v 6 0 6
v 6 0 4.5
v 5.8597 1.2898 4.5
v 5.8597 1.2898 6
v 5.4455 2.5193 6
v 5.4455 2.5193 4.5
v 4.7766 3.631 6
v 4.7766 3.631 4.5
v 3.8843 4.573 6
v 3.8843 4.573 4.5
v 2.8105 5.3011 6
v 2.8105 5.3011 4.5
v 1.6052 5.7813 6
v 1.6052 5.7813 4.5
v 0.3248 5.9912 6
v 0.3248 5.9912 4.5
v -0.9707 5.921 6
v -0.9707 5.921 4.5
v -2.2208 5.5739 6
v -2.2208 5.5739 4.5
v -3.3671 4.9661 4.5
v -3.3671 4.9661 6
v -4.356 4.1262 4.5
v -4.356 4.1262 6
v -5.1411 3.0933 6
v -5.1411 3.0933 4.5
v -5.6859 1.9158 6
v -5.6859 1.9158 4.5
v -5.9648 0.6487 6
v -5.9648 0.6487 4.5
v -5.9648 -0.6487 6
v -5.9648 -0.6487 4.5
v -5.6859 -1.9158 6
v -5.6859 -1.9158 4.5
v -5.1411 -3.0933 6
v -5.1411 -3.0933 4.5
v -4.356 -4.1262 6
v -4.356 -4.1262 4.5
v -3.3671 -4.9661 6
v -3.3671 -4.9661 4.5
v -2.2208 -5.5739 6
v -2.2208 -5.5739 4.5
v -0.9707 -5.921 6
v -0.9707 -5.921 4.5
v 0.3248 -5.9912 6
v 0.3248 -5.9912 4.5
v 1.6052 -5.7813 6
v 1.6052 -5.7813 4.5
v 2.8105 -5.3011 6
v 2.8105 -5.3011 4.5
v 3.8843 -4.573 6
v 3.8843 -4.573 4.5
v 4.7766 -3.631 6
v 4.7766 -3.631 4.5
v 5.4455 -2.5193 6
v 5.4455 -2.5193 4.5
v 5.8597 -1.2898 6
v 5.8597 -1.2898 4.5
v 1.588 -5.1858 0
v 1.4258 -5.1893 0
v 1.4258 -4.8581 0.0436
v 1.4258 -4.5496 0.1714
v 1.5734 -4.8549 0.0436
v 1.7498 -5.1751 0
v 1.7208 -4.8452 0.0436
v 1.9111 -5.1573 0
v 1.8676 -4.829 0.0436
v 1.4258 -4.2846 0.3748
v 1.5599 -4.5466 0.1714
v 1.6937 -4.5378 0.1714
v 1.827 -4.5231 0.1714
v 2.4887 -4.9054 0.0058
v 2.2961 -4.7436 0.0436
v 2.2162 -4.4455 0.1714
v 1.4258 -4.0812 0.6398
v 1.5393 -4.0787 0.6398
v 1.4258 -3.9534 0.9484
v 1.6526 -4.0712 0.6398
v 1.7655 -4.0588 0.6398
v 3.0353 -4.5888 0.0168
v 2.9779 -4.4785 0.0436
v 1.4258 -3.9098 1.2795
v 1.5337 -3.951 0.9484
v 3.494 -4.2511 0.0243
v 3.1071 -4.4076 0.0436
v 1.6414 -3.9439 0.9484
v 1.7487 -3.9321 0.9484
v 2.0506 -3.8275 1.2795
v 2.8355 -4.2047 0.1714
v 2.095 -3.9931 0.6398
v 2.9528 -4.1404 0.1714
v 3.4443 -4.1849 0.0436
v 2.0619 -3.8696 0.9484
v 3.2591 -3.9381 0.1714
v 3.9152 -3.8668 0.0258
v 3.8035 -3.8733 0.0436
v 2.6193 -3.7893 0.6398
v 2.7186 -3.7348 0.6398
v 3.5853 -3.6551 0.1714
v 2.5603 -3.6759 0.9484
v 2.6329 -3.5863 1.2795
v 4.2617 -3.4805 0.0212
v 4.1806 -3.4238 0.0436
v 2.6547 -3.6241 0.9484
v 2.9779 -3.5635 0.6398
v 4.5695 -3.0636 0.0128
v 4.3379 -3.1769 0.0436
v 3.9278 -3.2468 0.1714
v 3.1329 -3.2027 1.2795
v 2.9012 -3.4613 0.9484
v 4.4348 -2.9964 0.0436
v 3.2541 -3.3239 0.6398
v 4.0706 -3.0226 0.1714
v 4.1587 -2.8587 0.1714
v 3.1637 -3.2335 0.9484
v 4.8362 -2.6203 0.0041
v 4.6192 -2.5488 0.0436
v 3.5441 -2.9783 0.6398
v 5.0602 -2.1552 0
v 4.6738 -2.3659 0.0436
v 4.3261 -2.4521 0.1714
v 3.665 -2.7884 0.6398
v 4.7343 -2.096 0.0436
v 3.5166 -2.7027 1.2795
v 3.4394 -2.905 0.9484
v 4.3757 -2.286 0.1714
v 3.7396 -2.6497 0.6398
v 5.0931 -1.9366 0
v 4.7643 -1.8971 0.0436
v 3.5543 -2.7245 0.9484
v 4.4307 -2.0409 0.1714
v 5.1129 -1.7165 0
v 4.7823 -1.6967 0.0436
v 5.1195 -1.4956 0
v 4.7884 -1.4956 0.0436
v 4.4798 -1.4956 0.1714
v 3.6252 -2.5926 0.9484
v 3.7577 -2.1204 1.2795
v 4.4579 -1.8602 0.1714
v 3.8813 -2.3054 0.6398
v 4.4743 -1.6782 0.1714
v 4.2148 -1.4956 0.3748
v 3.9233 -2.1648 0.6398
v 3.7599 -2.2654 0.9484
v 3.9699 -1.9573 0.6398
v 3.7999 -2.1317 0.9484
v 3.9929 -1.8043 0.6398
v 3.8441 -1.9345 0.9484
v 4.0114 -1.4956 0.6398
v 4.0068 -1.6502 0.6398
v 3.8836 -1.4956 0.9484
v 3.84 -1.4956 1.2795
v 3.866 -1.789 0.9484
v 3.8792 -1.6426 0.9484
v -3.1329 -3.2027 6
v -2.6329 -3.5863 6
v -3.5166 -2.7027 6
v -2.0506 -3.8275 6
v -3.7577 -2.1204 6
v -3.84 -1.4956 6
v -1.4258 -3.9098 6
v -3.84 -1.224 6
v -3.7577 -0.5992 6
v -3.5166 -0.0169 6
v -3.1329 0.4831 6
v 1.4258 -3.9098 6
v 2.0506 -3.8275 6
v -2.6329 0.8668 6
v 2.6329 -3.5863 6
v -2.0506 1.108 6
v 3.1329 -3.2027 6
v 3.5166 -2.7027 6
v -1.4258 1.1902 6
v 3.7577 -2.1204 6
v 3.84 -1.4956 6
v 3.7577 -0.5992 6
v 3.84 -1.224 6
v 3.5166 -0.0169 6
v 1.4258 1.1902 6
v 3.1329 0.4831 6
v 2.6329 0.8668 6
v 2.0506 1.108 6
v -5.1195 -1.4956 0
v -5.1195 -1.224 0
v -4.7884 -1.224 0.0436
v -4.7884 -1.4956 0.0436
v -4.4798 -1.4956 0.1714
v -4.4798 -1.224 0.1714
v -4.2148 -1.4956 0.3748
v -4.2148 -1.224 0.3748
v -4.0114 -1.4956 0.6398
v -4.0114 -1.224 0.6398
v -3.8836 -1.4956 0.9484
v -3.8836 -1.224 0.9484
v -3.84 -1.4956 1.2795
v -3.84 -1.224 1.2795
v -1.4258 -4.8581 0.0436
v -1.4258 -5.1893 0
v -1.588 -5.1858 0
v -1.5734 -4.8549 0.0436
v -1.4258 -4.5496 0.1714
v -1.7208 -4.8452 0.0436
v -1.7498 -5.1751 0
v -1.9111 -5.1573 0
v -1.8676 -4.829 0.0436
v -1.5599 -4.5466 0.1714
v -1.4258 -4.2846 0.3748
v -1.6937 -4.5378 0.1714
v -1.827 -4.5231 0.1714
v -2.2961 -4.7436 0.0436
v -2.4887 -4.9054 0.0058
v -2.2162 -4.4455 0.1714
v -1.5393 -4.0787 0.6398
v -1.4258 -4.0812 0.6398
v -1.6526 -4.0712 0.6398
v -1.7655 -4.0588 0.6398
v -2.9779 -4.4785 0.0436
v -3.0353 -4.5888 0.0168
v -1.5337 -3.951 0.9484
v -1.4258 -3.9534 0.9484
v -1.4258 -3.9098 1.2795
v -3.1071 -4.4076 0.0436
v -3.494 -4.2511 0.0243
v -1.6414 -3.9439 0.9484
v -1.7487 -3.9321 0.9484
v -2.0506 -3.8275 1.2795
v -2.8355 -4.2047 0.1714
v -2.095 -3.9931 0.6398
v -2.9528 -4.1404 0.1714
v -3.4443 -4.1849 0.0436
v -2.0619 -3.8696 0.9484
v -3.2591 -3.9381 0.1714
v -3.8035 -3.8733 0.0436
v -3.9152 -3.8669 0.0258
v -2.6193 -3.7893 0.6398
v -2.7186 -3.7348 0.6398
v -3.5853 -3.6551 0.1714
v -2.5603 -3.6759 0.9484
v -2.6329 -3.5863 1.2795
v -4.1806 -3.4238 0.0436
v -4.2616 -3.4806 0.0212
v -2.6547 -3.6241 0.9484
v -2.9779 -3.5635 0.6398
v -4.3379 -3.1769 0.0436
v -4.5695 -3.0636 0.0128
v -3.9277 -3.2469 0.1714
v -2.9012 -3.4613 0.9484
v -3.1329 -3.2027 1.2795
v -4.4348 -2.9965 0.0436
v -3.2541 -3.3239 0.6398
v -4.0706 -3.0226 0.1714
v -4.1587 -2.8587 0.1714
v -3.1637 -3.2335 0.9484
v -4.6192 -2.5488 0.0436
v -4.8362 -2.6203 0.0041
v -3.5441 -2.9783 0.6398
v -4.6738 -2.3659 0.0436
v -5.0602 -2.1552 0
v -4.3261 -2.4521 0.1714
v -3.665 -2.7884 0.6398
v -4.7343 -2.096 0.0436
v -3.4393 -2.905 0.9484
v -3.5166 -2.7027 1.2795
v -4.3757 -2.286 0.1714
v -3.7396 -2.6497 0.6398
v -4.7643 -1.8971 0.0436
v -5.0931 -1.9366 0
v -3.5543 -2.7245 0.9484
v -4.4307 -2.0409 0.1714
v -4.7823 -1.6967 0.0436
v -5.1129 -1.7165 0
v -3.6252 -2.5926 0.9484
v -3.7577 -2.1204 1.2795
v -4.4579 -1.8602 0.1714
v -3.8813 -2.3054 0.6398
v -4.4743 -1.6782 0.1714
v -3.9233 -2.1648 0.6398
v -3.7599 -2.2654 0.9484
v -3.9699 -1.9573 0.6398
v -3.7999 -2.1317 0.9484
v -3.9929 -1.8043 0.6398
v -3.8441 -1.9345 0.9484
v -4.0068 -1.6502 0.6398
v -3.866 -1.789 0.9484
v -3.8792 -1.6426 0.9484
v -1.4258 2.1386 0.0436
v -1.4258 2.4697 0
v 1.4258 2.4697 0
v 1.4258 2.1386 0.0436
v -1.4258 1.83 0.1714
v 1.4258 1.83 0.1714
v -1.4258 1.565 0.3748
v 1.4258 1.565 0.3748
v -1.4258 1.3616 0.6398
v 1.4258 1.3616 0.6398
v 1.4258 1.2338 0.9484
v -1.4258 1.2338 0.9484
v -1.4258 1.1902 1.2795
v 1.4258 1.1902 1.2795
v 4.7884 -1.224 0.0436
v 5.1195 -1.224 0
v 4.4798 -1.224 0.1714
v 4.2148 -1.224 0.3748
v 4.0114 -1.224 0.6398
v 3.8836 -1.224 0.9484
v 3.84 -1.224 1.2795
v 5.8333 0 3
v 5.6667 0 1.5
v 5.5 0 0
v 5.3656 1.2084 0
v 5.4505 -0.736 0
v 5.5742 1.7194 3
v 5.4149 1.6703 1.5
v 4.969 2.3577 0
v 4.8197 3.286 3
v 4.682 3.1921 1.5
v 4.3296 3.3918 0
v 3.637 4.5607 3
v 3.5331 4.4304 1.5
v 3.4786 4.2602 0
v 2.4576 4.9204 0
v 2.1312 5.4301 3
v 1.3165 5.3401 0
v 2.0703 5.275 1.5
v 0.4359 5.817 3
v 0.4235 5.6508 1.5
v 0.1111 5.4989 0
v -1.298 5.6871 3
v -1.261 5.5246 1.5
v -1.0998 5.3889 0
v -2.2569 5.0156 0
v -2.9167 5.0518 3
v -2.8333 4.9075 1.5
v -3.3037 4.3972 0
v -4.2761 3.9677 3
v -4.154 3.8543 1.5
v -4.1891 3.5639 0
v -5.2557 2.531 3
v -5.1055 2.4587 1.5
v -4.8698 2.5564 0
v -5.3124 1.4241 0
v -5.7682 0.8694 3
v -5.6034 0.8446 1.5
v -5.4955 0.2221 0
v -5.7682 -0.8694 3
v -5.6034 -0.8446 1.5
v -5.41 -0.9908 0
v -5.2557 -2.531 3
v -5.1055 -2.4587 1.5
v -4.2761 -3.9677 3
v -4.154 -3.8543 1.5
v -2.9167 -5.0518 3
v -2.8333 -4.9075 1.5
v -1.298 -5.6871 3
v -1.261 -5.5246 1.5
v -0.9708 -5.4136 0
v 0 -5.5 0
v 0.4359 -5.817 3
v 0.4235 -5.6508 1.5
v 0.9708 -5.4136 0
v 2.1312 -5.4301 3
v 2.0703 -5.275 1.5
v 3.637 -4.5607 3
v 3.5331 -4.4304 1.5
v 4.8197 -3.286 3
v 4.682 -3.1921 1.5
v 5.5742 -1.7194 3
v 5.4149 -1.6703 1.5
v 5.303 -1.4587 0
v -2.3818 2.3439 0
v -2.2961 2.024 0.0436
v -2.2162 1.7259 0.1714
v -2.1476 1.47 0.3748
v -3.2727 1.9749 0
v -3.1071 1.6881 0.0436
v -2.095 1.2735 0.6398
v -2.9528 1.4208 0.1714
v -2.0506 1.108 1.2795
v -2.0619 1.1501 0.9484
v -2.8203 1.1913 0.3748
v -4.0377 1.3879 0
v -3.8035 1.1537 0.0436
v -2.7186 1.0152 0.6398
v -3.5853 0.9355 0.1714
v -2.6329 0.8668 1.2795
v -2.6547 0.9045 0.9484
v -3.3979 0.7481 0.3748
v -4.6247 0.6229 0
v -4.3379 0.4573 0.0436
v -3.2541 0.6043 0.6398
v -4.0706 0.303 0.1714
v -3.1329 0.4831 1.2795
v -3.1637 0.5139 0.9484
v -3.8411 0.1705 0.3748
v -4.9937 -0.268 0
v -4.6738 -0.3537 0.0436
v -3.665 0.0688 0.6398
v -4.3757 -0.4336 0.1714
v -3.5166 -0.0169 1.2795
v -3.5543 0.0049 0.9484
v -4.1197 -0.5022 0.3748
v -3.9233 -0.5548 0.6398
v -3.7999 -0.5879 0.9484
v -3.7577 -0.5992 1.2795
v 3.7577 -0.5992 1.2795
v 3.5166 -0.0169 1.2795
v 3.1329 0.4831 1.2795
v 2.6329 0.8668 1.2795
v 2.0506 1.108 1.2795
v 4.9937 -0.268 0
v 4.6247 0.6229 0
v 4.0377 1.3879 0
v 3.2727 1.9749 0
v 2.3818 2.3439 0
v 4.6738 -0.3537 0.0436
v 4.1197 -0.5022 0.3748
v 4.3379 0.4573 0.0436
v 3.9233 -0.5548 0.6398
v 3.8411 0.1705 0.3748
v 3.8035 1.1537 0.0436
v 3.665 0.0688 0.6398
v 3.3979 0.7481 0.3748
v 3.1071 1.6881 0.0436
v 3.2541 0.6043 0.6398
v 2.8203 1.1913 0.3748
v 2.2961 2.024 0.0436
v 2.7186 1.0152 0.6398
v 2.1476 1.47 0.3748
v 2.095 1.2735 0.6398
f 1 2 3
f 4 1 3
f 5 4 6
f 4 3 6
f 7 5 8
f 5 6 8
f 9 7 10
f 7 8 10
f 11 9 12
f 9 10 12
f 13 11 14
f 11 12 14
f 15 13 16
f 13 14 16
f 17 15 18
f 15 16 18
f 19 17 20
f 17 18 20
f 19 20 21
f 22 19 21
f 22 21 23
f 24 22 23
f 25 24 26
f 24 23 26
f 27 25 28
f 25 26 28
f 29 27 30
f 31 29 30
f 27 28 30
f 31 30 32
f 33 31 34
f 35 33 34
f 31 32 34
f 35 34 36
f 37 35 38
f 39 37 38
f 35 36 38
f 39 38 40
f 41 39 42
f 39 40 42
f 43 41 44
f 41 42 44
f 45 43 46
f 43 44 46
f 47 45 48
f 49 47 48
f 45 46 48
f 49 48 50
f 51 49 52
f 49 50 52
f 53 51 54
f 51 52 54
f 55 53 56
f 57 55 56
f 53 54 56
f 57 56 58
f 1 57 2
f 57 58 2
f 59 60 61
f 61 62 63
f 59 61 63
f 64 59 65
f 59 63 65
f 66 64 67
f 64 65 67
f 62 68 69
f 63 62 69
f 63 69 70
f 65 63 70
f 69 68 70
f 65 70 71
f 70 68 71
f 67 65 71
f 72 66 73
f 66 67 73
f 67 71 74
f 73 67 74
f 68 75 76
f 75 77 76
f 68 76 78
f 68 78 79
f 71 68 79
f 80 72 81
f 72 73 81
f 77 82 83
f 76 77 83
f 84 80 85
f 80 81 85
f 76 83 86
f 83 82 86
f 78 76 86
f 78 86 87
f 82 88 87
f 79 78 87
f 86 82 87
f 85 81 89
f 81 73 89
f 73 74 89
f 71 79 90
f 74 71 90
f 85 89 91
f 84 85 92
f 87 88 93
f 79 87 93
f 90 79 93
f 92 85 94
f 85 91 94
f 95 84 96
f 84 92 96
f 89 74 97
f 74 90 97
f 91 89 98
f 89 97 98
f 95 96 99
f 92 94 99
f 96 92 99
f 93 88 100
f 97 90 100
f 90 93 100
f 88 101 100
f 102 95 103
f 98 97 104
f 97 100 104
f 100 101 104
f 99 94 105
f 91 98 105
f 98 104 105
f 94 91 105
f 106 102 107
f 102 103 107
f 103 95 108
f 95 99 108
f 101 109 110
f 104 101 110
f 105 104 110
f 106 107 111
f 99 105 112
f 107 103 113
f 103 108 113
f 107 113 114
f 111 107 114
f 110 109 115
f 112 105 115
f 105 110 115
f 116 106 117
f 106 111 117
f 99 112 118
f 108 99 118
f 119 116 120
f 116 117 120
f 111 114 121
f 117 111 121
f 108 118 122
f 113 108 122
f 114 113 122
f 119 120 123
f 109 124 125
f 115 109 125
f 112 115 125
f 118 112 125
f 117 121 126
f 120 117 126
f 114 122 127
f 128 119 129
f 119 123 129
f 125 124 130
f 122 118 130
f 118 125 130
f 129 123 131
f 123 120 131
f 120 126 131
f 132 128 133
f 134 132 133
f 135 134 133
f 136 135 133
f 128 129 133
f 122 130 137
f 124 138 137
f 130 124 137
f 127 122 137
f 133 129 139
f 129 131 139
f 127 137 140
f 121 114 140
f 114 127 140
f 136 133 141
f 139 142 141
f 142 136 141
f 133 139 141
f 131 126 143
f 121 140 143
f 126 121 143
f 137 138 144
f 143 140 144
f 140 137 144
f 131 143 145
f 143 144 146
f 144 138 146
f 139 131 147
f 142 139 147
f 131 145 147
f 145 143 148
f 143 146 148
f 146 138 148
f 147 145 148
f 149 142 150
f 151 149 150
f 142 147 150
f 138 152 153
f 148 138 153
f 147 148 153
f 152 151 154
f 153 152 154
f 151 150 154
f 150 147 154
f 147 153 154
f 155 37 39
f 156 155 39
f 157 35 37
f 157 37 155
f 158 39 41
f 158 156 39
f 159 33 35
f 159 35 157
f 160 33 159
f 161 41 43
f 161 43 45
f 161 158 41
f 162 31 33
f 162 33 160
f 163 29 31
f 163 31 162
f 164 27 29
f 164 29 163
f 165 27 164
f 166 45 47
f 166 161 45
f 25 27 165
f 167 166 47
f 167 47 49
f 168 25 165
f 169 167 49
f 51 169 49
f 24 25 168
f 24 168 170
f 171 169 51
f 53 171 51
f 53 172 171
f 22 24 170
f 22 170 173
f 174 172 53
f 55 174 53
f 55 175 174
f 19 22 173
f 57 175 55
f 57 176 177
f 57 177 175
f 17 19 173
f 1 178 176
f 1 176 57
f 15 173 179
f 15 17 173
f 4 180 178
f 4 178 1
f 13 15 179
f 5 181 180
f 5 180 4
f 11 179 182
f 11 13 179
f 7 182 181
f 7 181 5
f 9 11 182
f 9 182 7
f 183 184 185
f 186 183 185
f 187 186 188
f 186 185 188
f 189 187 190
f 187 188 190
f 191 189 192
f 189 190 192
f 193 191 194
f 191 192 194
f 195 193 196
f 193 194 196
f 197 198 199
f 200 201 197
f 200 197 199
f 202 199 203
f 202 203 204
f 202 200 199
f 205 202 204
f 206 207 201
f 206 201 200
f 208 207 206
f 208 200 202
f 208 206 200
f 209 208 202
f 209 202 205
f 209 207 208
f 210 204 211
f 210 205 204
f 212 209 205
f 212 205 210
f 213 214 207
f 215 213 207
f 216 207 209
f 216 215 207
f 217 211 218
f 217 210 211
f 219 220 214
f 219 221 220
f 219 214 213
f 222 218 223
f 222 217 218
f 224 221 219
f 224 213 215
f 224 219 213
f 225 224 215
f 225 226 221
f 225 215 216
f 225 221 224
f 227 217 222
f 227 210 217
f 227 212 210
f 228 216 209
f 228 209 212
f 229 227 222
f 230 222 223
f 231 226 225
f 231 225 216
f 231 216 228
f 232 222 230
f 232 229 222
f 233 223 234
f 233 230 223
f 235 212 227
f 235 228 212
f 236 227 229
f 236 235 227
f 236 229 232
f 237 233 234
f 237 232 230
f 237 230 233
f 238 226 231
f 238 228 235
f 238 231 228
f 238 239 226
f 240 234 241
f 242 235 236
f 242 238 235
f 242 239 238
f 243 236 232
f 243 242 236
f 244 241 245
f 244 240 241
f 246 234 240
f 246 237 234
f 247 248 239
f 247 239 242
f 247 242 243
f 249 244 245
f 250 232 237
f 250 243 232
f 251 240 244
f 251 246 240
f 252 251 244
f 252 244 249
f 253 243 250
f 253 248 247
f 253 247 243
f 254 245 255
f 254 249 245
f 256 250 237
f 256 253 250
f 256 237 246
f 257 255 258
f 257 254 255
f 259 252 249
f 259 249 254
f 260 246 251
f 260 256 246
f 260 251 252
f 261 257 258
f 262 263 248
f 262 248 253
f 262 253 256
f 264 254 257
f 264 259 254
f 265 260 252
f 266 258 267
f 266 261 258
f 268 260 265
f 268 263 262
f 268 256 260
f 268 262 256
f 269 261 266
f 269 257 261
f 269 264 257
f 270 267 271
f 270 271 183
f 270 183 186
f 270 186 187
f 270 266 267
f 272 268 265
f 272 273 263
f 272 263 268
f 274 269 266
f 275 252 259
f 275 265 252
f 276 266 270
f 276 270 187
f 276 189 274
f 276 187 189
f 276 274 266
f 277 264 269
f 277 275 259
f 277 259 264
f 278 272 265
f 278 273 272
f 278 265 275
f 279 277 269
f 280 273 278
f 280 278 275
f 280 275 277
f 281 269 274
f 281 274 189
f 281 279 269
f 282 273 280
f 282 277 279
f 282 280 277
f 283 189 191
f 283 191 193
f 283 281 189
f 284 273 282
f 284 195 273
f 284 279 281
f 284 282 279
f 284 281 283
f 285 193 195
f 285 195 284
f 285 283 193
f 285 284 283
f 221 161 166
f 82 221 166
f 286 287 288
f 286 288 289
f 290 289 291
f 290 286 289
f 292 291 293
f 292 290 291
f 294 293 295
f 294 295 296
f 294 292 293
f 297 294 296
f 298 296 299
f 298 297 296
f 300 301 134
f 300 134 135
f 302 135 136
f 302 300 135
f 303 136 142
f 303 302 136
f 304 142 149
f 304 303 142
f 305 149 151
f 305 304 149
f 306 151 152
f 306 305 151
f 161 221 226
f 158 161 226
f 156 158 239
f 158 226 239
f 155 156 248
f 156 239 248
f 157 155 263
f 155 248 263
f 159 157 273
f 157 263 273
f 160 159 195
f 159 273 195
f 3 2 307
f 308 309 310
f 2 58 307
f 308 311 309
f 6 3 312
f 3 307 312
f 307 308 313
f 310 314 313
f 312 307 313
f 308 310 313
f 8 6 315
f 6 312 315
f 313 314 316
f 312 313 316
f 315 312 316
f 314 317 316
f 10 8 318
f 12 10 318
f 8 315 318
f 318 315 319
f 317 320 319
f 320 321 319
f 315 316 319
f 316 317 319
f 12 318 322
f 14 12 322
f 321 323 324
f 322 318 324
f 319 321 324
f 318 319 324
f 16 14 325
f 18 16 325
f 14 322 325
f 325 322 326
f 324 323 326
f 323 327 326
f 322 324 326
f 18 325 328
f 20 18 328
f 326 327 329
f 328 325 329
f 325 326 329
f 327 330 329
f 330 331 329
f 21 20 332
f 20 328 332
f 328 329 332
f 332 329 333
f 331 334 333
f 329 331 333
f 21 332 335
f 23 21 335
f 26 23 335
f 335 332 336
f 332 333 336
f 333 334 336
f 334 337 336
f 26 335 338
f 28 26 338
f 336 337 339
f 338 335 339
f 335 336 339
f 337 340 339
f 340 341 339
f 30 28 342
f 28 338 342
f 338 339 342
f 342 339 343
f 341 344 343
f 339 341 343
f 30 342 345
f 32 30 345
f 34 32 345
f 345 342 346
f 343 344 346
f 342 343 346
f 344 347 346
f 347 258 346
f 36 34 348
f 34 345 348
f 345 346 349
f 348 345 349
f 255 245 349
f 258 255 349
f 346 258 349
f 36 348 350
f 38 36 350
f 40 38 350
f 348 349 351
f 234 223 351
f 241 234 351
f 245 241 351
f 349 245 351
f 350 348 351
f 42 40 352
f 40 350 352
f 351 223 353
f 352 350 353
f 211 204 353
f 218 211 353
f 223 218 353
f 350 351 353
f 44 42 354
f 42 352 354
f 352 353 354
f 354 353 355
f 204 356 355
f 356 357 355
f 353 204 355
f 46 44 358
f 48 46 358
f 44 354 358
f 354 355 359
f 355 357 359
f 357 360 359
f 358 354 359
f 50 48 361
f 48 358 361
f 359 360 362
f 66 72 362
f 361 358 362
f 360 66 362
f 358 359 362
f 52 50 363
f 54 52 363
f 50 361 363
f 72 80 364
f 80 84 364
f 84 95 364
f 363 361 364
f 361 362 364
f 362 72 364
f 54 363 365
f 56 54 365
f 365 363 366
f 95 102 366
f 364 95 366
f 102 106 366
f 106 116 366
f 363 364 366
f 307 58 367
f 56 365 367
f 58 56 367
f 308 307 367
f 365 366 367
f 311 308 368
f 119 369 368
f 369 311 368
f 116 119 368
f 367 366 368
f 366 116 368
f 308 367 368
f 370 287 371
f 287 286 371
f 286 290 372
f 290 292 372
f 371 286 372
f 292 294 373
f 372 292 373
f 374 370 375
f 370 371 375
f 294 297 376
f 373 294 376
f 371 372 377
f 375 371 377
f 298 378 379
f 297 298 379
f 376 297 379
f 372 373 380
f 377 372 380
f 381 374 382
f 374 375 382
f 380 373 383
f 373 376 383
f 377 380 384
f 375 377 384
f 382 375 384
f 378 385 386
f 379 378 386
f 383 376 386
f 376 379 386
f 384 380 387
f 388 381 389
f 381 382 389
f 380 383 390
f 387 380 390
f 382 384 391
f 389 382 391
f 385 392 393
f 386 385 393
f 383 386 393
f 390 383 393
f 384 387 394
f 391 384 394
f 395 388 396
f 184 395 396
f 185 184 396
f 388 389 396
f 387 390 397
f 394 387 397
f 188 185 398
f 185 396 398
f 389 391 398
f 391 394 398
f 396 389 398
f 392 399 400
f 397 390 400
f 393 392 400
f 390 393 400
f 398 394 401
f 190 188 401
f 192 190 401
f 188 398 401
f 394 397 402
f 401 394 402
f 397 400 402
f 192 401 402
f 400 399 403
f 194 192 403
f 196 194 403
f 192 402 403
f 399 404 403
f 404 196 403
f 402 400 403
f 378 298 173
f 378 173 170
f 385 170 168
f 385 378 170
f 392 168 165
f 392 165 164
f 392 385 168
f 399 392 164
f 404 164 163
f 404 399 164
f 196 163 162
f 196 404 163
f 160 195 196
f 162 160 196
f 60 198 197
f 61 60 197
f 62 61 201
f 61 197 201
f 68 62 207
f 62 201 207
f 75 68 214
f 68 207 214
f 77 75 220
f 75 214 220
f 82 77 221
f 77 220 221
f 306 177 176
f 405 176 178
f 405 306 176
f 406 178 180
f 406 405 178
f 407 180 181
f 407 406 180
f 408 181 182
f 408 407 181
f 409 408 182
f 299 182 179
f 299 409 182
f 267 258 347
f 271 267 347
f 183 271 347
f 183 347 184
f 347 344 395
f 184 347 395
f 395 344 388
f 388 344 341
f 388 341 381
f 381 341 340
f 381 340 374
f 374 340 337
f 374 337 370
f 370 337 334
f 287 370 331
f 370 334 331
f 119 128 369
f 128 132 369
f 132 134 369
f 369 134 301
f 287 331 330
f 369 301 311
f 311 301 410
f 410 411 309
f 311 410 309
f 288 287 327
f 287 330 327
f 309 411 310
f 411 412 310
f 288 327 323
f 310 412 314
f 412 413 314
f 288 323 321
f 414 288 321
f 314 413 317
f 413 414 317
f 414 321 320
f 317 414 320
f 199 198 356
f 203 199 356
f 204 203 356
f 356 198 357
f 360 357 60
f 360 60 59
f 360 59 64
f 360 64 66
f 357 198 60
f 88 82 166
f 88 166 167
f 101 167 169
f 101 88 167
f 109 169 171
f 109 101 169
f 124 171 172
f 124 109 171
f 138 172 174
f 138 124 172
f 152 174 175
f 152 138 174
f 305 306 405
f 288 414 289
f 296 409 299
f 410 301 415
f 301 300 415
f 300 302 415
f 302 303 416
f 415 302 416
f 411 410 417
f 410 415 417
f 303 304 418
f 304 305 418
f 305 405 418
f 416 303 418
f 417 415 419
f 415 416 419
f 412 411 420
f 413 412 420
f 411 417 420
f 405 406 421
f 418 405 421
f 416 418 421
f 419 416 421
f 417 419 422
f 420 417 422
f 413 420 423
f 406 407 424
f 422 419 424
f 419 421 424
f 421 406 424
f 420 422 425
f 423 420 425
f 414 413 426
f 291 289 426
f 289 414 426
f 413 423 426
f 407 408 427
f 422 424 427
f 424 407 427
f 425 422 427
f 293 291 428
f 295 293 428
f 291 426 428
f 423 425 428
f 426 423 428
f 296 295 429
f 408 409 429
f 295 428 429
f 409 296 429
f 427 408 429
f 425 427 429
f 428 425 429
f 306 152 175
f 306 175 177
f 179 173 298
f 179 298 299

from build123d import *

# Parameters (mm, degrees)
F0_R         = 6
F1_DEPTH     = 6
F2_W         = 7.68
F2_H         = 5.1
F3_DEPTH     = 25
F4_R         = 2.4142135624
F5_SIZE2     = 0.5
F5_SIZE      = 4.5
F6_T1_DEPTH  = 2.8515728753
F6_T3_DEPTH  = 0.2715728753
F6_T6_ANGLE  = 90
F6_T8_ANGLE  = 90
F6_T10_ANGLE = 90
F6_T12_ANGLE = 90


# Not quite as in the source:
# - a fillet or chamfer that OpenCascade refuses, or shapes differently, is made with other operations: its cross-section is extruded or revolved along the edge and cut away or added


with BuildPart() as f1:
    # F0 (on Top) → F1 (new body)
    with BuildSketch(Plane.XY):
        Circle(F0_R)
    extrude(amount=F1_DEPTH)

    # F2 (on face) → F3 (cut)
    with BuildSketch(Plane.XY.offset(6)):
        with Locations((0, -1.3597839279)):
            Rectangle(F2_W, F2_H)
    extrude(amount=-F3_DEPTH, mode=Mode.SUBTRACT)

    # F4
    f4_edges = [f1.edges().sort_by_distance(p)[0] for p in [
        (-3.84, 1.190216, 3),
        (3.84, 1.190216, 3),
        (3.84, -3.909784, 3),
        (-3.84, -3.909784, 3),
    ]]
    fillet(f4_edges, radius=F4_R)

    # F5
    f5_edges = [f1.edges().sort_by_distance(p)[0] for p in [
        (-6, 0, 0),
    ]]
    f5_side = f1.faces().sort_by_distance((-6, 0, 3))[0]
    chamfer(f5_edges, length=F5_SIZE, length2=F5_SIZE2, reference=f5_side)

    # F6: fillet of radius 1.2795331881 on 8 edges, made by hand

    # F6_s2 → F6_t1 (cut)
    with BuildSketch(Plane.YZ.offset(-1.4257864376)):
        with BuildLine():
            ThreePointArc((-5.189317116, 0), (-4.2845505219, 0.374766594), (-3.9097839279, 1.2795331881))
            Line((-3.9097839279, 1.2795331881), (-3.9097839279, 0))
            Line((-3.9097839279, 0), (-5.189317116, 0))
        make_face()
        with BuildLine():
            ThreePointArc((2.4697492601, 0), (1.5649826661, 0.374766594), (1.1902160721, 1.2795331881))
            Line((1.1902160721, 1.2795331881), (1.1902160721, 0))
            Line((1.1902160721, 0), (2.4697492601, 0))
        make_face()
    extrude(amount=F6_T1_DEPTH, mode=Mode.SUBTRACT)

    # F6_s4 → F6_t3 (cut)
    with BuildSketch(Plane.XZ.offset(1.2239974903)):
        with BuildLine():
            ThreePointArc((-5.1195331881, 0), (-4.214766594, 0.374766594), (-3.84, 1.2795331881))
            Line((-3.84, 1.2795331881), (-3.84, 0))
            Line((-3.84, 0), (-5.1195331881, 0))
        make_face()
        with BuildLine():
            ThreePointArc((5.1195331881, 0), (4.214766594, 0.374766594), (3.84, 1.2795331881))
            Line((3.84, 1.2795331881), (3.84, 0))
            Line((3.84, 0), (5.1195331881, 0))
        make_face()
    extrude(amount=F6_T3_DEPTH, mode=Mode.SUBTRACT)

    # F6_s5 → F6_t6 (revolve, cut)
    with BuildSketch(Plane.YZ.offset(-1.4257864376)):
        with BuildLine():
            ThreePointArc((2.4697492601, 0), (1.5649826661, 0.374766594), (1.1902160721, 1.2795331881))
            Line((1.1902160721, 1.2795331881), (1.1902160721, 0))
            Line((1.1902160721, 0), (2.4697492601, 0))
        make_face()
    revolve(axis=Axis((-1.4257864376, -1.2239974903, 0), (0, 0, 1)), revolution_arc=F6_T6_ANGLE, mode=Mode.SUBTRACT)

    # F6_s7 → F6_t8 (revolve, cut)
    with BuildSketch(Plane.YZ.offset(-1.4257864376)):
        with BuildLine():
            ThreePointArc((-5.189317116, 0), (-4.2845505219, 0.374766594), (-3.9097839279, 1.2795331881))
            Line((-3.9097839279, 1.2795331881), (-3.9097839279, 0))
            Line((-3.9097839279, 0), (-5.189317116, 0))
        make_face()
    revolve(axis=Axis((-1.4257864376, -1.4955703655, 0), (0, 0, -1)), revolution_arc=F6_T8_ANGLE, mode=Mode.SUBTRACT)

    # F6_s9 → F6_t10 (revolve, cut)
    with BuildSketch(Plane.YZ.offset(1.4257864376)):
        with BuildLine():
            ThreePointArc((-5.189317116, 0), (-4.2845505219, 0.374766594), (-3.9097839279, 1.2795331881))
            Line((-3.9097839279, 1.2795331881), (-3.9097839279, 0))
            Line((-3.9097839279, 0), (-5.189317116, 0))
        make_face()
    revolve(axis=Axis((1.4257864376, -1.4955703655, 0), (0, 0, 1)), revolution_arc=F6_T10_ANGLE, mode=Mode.SUBTRACT)

    # F6_s11 → F6_t12 (revolve, cut)
    with BuildSketch(Plane.XZ.offset(1.2239974903)):
        with BuildLine():
            ThreePointArc((5.1195331881, 0), (4.214766594, 0.374766594), (3.84, 1.2795331881))
            Line((3.84, 1.2795331881), (3.84, 0))
            Line((3.84, 0), (5.1195331881, 0))
        make_face()
    revolve(axis=Axis((1.4257864376, -1.2239974903, 0), (0, 0, 1)), revolution_arc=F6_T12_ANGLE, mode=Mode.SUBTRACT)


solid = f1.part
